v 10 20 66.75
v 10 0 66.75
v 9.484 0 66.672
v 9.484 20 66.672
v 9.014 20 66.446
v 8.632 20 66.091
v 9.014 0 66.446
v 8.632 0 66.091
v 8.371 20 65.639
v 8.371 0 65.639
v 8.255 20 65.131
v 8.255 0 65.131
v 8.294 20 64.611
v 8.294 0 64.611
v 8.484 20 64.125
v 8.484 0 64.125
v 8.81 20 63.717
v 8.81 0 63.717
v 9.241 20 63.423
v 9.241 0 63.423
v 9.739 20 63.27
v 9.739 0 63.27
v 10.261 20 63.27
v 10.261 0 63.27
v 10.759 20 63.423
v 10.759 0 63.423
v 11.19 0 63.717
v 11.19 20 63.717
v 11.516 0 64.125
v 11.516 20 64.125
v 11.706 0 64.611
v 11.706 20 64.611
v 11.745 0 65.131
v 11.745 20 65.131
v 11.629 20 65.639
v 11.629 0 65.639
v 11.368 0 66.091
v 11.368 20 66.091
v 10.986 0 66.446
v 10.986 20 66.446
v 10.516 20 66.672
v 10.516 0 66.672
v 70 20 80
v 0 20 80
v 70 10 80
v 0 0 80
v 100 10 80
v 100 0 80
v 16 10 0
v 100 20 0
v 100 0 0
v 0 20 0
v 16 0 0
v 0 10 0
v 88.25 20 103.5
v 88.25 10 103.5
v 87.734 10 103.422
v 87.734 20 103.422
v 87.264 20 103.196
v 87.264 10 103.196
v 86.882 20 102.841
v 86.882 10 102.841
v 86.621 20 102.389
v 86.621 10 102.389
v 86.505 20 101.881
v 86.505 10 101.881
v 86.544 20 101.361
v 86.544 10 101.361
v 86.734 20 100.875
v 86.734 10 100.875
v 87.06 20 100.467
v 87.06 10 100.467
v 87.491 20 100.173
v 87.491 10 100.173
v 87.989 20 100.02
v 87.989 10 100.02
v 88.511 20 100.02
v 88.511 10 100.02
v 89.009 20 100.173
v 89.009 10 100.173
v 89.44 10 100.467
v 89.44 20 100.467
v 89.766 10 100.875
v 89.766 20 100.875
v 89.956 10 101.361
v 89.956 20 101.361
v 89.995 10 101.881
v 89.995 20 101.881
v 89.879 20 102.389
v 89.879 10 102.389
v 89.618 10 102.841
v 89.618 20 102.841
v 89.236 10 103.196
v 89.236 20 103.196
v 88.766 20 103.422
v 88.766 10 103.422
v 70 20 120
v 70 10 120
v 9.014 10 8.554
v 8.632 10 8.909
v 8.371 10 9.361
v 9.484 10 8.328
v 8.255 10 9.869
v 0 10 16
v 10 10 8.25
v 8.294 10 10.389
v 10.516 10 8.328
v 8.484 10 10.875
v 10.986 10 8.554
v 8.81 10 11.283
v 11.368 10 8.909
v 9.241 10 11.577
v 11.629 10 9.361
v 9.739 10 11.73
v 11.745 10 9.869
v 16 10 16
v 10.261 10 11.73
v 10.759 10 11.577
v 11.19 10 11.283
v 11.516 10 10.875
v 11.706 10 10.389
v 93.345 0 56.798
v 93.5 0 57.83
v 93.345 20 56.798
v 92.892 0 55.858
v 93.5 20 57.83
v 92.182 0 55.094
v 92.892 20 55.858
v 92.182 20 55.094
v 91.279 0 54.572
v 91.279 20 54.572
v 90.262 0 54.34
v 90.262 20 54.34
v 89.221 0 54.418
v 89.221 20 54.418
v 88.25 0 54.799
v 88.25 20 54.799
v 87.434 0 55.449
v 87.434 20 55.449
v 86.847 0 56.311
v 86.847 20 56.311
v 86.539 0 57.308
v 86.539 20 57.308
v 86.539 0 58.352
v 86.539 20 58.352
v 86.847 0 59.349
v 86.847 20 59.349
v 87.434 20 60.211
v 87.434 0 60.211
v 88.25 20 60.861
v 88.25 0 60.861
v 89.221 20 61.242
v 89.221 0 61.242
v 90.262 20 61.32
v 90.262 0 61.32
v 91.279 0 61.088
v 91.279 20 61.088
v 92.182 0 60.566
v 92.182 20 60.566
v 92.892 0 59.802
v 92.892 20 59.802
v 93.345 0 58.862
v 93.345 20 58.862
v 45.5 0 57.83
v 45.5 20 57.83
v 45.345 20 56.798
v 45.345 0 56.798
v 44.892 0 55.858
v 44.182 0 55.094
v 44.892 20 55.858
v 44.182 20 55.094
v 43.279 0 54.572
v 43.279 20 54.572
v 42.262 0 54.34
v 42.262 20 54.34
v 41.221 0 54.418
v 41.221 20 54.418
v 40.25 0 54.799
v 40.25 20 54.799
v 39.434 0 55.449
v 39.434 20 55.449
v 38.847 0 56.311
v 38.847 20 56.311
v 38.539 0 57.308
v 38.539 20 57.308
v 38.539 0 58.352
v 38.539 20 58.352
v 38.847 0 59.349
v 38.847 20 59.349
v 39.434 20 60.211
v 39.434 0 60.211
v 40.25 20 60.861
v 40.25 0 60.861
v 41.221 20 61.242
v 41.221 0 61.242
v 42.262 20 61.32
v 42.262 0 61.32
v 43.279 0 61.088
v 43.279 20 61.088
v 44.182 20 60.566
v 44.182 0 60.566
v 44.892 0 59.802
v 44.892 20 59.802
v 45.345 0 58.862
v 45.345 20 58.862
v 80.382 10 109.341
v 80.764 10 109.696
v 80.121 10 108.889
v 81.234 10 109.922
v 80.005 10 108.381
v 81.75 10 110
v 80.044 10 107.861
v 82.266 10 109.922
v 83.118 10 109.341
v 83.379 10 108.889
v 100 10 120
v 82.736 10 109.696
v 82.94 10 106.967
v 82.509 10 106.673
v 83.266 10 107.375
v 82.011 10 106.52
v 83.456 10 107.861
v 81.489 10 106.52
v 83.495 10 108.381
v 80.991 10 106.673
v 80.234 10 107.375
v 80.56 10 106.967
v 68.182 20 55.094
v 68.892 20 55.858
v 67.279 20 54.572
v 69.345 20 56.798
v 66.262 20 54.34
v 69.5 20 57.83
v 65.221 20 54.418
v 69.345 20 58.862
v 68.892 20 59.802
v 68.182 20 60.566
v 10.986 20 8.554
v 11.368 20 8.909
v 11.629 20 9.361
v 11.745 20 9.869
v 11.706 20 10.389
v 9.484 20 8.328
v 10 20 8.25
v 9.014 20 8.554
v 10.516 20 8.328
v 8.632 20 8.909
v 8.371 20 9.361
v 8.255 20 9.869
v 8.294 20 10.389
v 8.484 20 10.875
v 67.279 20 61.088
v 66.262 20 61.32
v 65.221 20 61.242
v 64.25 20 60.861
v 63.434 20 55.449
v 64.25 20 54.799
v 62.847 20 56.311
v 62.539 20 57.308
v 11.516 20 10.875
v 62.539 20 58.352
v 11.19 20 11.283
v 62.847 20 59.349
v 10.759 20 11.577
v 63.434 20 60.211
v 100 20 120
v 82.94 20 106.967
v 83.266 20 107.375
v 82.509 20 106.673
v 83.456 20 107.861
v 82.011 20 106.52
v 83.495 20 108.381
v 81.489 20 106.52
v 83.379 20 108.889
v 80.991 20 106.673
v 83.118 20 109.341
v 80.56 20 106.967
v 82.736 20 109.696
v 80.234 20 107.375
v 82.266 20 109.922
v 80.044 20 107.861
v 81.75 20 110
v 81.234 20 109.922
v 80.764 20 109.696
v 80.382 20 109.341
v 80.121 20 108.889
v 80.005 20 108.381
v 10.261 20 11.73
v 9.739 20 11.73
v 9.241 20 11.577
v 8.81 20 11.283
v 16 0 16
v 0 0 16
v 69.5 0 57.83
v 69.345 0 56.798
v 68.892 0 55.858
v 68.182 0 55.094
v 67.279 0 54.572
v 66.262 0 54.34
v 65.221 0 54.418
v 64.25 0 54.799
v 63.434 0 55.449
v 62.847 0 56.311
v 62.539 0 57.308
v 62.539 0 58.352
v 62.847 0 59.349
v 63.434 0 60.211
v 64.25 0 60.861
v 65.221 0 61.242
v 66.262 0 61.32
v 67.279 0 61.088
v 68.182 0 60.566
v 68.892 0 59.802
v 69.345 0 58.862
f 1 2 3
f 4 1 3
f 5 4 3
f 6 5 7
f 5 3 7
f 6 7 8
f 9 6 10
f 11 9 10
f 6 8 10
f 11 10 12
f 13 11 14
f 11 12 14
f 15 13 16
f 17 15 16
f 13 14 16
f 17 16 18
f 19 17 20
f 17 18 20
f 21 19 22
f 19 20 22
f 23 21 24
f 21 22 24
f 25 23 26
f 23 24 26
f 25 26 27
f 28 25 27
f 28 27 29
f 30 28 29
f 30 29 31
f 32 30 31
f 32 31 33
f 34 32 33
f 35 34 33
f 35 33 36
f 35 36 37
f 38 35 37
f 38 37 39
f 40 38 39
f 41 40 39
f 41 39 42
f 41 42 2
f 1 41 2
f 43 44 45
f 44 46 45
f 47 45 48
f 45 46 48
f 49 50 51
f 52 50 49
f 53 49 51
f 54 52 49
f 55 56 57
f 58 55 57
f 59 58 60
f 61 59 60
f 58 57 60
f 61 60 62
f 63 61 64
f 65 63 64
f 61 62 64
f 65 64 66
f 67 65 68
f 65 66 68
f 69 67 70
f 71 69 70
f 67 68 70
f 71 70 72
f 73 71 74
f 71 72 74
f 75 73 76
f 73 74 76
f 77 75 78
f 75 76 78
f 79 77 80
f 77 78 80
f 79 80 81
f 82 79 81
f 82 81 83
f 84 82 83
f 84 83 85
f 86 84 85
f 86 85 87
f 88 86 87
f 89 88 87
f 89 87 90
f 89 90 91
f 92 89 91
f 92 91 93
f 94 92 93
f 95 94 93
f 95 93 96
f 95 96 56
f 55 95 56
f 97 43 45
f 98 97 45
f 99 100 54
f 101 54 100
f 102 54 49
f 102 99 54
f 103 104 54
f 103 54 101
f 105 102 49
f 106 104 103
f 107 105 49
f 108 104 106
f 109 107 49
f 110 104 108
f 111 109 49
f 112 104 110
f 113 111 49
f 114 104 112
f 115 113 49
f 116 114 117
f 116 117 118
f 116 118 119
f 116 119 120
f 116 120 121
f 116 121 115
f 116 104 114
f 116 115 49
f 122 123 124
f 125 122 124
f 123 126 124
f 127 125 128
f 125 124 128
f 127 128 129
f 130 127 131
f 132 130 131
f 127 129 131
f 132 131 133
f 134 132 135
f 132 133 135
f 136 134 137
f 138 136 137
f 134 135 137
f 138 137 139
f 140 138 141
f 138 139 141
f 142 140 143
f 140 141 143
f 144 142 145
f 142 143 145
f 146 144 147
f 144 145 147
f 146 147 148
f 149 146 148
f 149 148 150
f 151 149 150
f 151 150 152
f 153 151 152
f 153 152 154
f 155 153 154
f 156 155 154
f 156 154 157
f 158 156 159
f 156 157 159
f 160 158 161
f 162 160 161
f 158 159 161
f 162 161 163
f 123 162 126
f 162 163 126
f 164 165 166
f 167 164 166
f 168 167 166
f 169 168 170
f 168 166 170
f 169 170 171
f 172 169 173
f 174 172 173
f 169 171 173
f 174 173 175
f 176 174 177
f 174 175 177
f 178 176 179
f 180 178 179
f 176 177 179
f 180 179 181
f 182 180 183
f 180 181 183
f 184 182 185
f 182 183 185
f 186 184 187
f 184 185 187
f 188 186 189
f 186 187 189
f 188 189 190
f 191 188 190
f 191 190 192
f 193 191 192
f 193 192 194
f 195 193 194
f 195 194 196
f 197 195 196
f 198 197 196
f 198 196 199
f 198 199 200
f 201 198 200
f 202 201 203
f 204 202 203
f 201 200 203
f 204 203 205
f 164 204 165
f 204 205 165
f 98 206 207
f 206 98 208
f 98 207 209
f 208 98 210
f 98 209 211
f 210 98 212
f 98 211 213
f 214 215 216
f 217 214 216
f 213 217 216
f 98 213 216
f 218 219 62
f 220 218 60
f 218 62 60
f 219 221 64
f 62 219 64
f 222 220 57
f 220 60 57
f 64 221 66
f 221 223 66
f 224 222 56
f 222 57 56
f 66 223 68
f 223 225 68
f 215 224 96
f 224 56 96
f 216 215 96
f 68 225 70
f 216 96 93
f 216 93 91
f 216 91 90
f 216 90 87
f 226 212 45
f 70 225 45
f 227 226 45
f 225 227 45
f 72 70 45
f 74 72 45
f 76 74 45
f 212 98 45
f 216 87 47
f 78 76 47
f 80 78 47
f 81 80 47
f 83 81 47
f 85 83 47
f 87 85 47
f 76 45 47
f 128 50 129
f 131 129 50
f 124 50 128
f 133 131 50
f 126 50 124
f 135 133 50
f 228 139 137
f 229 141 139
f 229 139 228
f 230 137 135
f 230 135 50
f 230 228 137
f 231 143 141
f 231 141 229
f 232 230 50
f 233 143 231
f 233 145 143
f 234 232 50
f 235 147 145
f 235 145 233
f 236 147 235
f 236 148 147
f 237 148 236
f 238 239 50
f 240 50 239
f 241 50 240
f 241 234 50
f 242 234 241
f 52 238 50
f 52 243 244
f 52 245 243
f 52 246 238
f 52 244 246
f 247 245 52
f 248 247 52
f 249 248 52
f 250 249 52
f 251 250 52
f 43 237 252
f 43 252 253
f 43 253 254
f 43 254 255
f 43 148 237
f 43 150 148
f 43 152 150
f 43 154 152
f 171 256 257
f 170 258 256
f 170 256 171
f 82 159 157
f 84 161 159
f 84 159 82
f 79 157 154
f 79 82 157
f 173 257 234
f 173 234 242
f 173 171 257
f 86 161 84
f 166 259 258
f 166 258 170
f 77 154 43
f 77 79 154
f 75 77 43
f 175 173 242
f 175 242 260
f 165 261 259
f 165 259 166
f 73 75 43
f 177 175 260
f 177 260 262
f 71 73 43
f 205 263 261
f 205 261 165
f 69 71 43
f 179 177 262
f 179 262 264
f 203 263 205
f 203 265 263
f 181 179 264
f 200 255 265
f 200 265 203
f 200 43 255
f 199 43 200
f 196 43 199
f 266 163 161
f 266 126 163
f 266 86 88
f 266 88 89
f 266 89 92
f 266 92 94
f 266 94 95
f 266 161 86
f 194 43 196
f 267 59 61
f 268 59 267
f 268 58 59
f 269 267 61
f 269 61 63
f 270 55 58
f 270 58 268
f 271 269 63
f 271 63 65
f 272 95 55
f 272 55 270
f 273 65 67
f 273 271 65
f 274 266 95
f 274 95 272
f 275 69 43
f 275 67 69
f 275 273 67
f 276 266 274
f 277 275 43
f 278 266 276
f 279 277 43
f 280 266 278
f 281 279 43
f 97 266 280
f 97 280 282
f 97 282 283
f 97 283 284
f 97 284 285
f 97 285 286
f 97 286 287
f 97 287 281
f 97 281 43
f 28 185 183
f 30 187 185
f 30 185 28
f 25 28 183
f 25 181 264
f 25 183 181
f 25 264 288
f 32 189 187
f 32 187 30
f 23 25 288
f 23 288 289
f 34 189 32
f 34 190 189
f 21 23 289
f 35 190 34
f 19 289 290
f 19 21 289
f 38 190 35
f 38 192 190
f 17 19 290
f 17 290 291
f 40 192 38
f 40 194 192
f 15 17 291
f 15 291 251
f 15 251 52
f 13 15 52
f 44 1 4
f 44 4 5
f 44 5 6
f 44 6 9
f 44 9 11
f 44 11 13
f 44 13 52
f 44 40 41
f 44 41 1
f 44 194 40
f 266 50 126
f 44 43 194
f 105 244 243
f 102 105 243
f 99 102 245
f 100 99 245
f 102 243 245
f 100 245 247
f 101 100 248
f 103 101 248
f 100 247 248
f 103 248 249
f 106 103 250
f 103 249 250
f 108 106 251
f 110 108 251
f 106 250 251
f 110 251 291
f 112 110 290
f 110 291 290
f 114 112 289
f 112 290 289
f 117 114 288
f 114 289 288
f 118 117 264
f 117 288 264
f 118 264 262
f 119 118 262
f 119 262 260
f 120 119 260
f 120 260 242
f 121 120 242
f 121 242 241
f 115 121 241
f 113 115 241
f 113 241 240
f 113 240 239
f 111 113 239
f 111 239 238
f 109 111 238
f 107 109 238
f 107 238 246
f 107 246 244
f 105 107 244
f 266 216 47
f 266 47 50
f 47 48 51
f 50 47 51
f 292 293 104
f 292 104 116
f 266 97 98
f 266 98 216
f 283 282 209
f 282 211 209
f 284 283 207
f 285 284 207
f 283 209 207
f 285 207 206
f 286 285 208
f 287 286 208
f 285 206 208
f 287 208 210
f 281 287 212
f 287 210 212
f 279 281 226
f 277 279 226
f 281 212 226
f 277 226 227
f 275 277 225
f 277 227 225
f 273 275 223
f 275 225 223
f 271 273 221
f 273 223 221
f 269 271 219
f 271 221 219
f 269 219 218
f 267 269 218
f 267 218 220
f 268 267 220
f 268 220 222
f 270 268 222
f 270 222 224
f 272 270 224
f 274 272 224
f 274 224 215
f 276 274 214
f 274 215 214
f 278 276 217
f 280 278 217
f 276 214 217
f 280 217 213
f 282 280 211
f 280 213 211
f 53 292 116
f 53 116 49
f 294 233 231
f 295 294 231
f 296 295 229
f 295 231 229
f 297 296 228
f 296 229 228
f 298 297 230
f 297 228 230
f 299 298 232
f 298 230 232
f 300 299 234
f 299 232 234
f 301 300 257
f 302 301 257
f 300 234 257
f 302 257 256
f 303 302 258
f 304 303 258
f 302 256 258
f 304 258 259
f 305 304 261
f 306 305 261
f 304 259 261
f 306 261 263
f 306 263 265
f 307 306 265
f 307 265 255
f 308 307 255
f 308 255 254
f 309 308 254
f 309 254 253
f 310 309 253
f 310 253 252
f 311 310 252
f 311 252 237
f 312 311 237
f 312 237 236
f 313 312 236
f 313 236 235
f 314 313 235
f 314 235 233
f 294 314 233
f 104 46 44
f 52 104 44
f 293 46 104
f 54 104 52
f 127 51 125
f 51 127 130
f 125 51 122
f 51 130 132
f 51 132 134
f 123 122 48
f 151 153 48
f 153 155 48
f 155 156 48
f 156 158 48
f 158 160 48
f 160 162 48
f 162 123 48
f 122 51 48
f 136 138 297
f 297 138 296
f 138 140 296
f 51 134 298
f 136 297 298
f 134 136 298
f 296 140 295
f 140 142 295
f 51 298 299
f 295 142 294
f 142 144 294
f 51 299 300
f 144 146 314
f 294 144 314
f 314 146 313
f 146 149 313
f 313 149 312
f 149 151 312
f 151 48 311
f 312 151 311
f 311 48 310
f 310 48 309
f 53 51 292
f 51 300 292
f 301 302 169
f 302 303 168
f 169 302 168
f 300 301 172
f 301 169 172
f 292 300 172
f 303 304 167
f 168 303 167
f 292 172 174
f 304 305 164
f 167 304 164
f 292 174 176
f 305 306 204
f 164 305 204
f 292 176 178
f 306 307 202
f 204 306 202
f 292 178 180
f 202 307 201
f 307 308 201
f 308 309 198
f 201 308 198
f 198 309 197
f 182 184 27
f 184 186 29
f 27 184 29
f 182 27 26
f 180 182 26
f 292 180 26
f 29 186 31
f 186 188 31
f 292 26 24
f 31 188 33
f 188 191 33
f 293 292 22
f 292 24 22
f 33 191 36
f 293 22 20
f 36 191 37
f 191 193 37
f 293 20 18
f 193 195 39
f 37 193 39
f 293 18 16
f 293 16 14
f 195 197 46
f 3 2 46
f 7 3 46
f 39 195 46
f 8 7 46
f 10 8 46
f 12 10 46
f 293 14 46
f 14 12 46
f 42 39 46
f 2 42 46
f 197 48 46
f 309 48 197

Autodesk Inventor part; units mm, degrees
ref_plane "YZ Plane" through (0, 0, 0) normal (1, 0, 0) x (0, 1, 0)
ref_plane "XZ Plane" through (0, 0, 0) normal (0, 1, 0) x (-1, 0, 0)
ref_plane "XY Plane" through (0, 0, 0) normal (0, 0, 1) x (1, 0, 0)
sketch "Boceto1" plane through (0, 0, 0) normal (0, 1, 0) x (-1, 0, 0)
  line L0 (100, 80) -> (-100, 80)
  line L1 (-100, 80) -> (-100, -80)
  line L2 (-100, -80) -> (100, -80)
  line L3 (100, -80) -> (100, 80)
  line L4 (100, 80) -> (-100, -80) construction
  line L5 (-100, 80) -> (100, -80) construction
  point P0 (0, 0)
  dimension "d0" = 200
  dimension "d1" = 160
extrude "Extrusión1" add sketch "Boceto1" along normal blind 20
sketch "Boceto2" plane through (0, 20, 0) normal (0, 1, 0) x (1, 0, 0)
  circle A0 centre (-90, -57.83) radius 3.5
  line L0 (-100, -65.43) -> (-32, -65.43)
  line L1 (-32, -65.43) -> (-32, 14.57)
  line L2 (-32, 14.57) -> (-100, 14.57)
  line L3 (-100, 14.57) -> (-100, -65.43)
  line L4 (-66, -65.43) -> (-66, -8.508)
  circle A1 centre (-66, -57.83) radius 3.5
  circle A2 centre (-42, -57.83) radius 3.5
  line L5 (-32, -25.43) -> (-48.2072, -25.43)
  circle A3 centre (-42, 6.97) radius 3.5
  circle A4 centre (-66, 6.97) radius 3.5
  circle A5 centre (-90, 6.97) radius 3.5
  circle A6 centre (-60, 55) radius 5
  line L6 (-100, 80) -> (-100, -80) projected
  line L7 (0, 0) -> (0, -20.5185)
  circle A7 centre (90, -57.83) radius 3.5
  circle A8 centre (66, -57.83) radius 3.5
  circle A9 centre (42, -57.83) radius 3.5
  line L8 (100, -65.43) -> (32, -65.43)
  line L9 (66, -65.43) -> (66, -8.508)
  line L10 (32, -25.43) -> (48.2072, -25.43)
  circle A10 centre (90, 6.97) radius 3.5
  line L11 (100, 14.57) -> (100, -65.43)
  circle A11 centre (66, 6.97) radius 3.5
  line L12 (32, 14.57) -> (100, 14.57)
  line L13 (32, -65.43) -> (32, 14.57)
  circle A12 centre (42, 6.97) radius 3.5
  circle A13 centre (60, 55) radius 5
  line L14 (100, 80) -> (100, -80)
  dimension "d4" = 7
  dimension "d5" = 68
  dimension "d6" = 80
  dimension "d7" = 7.6
  dimension "d8" = 10
  dimension "d9" = 7
  dimension "d10" = 24
  dimension "d11" = 10
  dimension "d16" = 0
  dimension "d19" = 40
extrude "Extrusión2" cut sketch "Boceto2" against normal blind 20 contours A0 | A1 L4 | L4 A1 | A2 | A3 | A4 | A5 | A7 | A8 L9 | L9 A8 | A9 | A10 | A11 | A12
sketch "Boceto3" plane through (-100, 0, 80) normal (0, 0, 1) x (1, 0, 0)
  line L0 (0, 20) -> (30, 20)
  line L1 (30, 20) -> (30, 10)
  line L2 (30, 10) -> (0, 10)
  line L3 (0, 10) -> (0, 20)
  line L4 (100, 0) -> (100, 11.6249)
  line L5 (200, 20) -> (170, 20)
  line L6 (170, 20) -> (170, 10)
  line L7 (170, 10) -> (200, 10)
  line L8 (200, 10) -> (200, 20)
  dimension "d22" = 30
  dimension "d23" = 10
extrude "Extrusión3" add sketch "Boceto3" along normal blind 40
sketch "Boceto4" plane through (0, 20, 0) normal (0, 1, 0) x (1, 0, 0)
  line L0 (-60, 60) -> (-60, 50)
  line L1 (-70, 50) -> (-70, 60)
  line L2 (-60, 50) -> (-70, 60) construction
  line L3 (-70, 50) -> (-60, 60) construction
  line L4 (-60, 50) -> (-70, 50)
  circle A0 centre (-68.25, 51.75) radius 1.75
  line L5 (-70, 60) -> (-60, 60)
  circle A1 centre (-61.75, 58.25) radius 1.75
  line L6 (100, 80) -> (-100, 80) projected
  line L7 (0, 80) -> (0, 60)
  line L8 (60, 60) -> (60, 50)
  circle A2 centre (61.75, 58.25) radius 1.75
  line L9 (70, 60) -> (60, 60)
  line L10 (70, 50) -> (70, 60)
  line L11 (60, 50) -> (70, 60) construction
  line L12 (70, 50) -> (60, 60) construction
  line L13 (60, 50) -> (70, 50)
  circle A3 centre (68.25, 51.75) radius 1.75
  line L14 (-100, 80) -> (-100, -120) projected
  line L15 (100, 80) -> (100, -120) projected
  point P0 (0, 0)
  point P1 (-70.0286, 64.971)
  point P2 (-65, 50)
  point P3 (70.0286, 64.971)
  point P4 (65, 50)
  dimension "d26" = 1.75
  dimension "d27" = 8.25
  dimension "d28" = 20
  dimension "d29" = 10
  dimension "d30" = 10
  dimension "d31" = 1.75
  dimension "d32" = 1.75
  dimension "d33" = 1.75
  dimension "d58" = 30
  dimension "d59" = 30
extrude "Extrusión4" cut sketch "Boceto4" against normal blind 40 contours A1 | A0 | A2 | A3
sketch "Boceto5" plane through (0, 20, 0) normal (0, 1, 0) x (1, 0, 0)
  line L0 (-100, -80) -> (-100, -120)
  line L1 (-70.0001, -120) -> (-70.0001, -80)
  line L2 (-55.1959, -79.9497) -> (-70.0001, -80)
  line L3 (-70.0001, -80) -> (-100, -80)
  line L4 (-100, -120) -> (-70.0001, -120)
  line L5 (-64.3507, -80) -> (-74.3507, -80)
  circle A0 centre (-81.75, -108.25) radius 1.75
  circle A1 centre (-88.25, -101.75) radius 1.75
  line L6 (-70.0001, -80) -> (70.0001, -80)
  line L7 (0, -80) -> (0, -101.75)
  circle A2 centre (81.75, -108.25) radius 1.75
  circle A3 centre (88.25, -101.75) radius 1.75
  line L8 (-70, -80) -> (70, -80) projected
  line L9 (-100, 80) -> (-100, -120) projected
  point P0 (0, 0)
  point P1 (-81.75, -101.75)
  point P2 (-63.4459, -118.25)
  point P3 (81.75, -101.75)
  dimension "d36" = 11.7499
  dimension "d37" = 40
  dimension "d38" = 29.9999
  dimension "d39" = 21.75
  dimension "d40" = 11.75
  dimension "d41" = 28.3003
  dimension "d42" = 11.7499
  dimension "d43" = 0
  dimension "d44" = 0
hole "Agujero1" at (-88.25, 20, 101.75) at (-81.75, 20, 108.25) at (81.75, 20, 108.25) at (88.25, 20, 101.75) direction (0, -1, 0) diameter 3.5 end through all
ref_plane "Plano de trabajo1" through (100, 0, 0) normal (0, 0, -1) x (-1, 0, 0)
ref_plane "Plano de trabajo2" through (0, 0, -80) normal (-1, 0, 0) x (0, 0, 1)
sketch "Boceto6" plane through (0, 0, 0) normal (0, -1, 0) x (1, 0, 0)
  circle A0 centre (10, -10) radius 1.75
  line L0 (6.803, 0) -> (14.6069, 0)
  line L1 (0, 0) -> (0, -4.8284)
  line L2 (0, 0) -> (20.0354, 0)
  circle A1 centre (10, 10) radius 1.75
  line L3 (0, 0) -> (0, 4.8284)
  circle A2 centre (-10, 10) radius 1.75
  circle A3 centre (-10, -10) radius 1.75
  dimension "d63" = 3.5
  dimension "d64" = 10
  dimension "d65" = 10
hole "Agujero2" at (10, 0, 10) at (-10, 0, 10) at (-10, 0, -10) at (10, 0, -10) direction (0, 1, 0) diameter 3.5 end through all
sketch "Boceto7" plane through (0, 0, 0) normal (0, -1, 0) x (1, 0, 0)
  line L0 (-16, 16) -> (16, 16)
  line L1 (16, 16) -> (16, -16)
  line L2 (16, -16) -> (-16, -16)
  line L3 (-16, -16) -> (-16, 16)
  line L4 (-16, 16) -> (16, -16) construction
  line L5 (16, 16) -> (-16, -16) construction
  point P0 (0, 0)
  point P1 (0, 0)
  point P2 (0, 0)
  dimension "d73" = 32
  dimension "d74" = 32
extrude "Extrusión5" cut sketch "Boceto7" against normal blind 10
sketch "Boceto8" plane through (0, 20, 0) normal (0, 1, 0) x (1, 0, 0)
  line L0 (-15, -60) -> (15, -60)
  circle A0 centre (10, -65) radius 1.75
  line L1 (-10, -65) -> (10, -65)
  line L2 (15, -60) -> (15, -70)
  circle A1 centre (-10, -65) radius 1.75
  line L3 (-15, -70) -> (15, -60) construction
  line L4 (-15, -60) -> (15, -70) construction
  line L5 (-15, -70) -> (-15, -60)
  line L6 (15, -70) -> (-15, -70)
  point P0 (0, 0)
  point P1 (0, -69.1269)
  point P2 (-15, -67.1661)
  point P3 (0, -69.1269)
  point P4 (15, -65)
  dimension "d77" = 10
  dimension "d78" = 30
  dimension "d79" = 5
  dimension "d80" = 5
  dimension "d81" = 5
  dimension "d82" = 5
hole "Agujero3" at (-10, 20, 65) at (10, 20, 65) direction (0, -1, 0) diameter 3.5 end through all
split "Dividir1" plane through (100, 0, 0) removes the side toward (0, 0, -1)
split "Dividir2" plane through (0, 0, -80) removes the side toward (-1, 0, 0)
properties part number "base_back_4"
